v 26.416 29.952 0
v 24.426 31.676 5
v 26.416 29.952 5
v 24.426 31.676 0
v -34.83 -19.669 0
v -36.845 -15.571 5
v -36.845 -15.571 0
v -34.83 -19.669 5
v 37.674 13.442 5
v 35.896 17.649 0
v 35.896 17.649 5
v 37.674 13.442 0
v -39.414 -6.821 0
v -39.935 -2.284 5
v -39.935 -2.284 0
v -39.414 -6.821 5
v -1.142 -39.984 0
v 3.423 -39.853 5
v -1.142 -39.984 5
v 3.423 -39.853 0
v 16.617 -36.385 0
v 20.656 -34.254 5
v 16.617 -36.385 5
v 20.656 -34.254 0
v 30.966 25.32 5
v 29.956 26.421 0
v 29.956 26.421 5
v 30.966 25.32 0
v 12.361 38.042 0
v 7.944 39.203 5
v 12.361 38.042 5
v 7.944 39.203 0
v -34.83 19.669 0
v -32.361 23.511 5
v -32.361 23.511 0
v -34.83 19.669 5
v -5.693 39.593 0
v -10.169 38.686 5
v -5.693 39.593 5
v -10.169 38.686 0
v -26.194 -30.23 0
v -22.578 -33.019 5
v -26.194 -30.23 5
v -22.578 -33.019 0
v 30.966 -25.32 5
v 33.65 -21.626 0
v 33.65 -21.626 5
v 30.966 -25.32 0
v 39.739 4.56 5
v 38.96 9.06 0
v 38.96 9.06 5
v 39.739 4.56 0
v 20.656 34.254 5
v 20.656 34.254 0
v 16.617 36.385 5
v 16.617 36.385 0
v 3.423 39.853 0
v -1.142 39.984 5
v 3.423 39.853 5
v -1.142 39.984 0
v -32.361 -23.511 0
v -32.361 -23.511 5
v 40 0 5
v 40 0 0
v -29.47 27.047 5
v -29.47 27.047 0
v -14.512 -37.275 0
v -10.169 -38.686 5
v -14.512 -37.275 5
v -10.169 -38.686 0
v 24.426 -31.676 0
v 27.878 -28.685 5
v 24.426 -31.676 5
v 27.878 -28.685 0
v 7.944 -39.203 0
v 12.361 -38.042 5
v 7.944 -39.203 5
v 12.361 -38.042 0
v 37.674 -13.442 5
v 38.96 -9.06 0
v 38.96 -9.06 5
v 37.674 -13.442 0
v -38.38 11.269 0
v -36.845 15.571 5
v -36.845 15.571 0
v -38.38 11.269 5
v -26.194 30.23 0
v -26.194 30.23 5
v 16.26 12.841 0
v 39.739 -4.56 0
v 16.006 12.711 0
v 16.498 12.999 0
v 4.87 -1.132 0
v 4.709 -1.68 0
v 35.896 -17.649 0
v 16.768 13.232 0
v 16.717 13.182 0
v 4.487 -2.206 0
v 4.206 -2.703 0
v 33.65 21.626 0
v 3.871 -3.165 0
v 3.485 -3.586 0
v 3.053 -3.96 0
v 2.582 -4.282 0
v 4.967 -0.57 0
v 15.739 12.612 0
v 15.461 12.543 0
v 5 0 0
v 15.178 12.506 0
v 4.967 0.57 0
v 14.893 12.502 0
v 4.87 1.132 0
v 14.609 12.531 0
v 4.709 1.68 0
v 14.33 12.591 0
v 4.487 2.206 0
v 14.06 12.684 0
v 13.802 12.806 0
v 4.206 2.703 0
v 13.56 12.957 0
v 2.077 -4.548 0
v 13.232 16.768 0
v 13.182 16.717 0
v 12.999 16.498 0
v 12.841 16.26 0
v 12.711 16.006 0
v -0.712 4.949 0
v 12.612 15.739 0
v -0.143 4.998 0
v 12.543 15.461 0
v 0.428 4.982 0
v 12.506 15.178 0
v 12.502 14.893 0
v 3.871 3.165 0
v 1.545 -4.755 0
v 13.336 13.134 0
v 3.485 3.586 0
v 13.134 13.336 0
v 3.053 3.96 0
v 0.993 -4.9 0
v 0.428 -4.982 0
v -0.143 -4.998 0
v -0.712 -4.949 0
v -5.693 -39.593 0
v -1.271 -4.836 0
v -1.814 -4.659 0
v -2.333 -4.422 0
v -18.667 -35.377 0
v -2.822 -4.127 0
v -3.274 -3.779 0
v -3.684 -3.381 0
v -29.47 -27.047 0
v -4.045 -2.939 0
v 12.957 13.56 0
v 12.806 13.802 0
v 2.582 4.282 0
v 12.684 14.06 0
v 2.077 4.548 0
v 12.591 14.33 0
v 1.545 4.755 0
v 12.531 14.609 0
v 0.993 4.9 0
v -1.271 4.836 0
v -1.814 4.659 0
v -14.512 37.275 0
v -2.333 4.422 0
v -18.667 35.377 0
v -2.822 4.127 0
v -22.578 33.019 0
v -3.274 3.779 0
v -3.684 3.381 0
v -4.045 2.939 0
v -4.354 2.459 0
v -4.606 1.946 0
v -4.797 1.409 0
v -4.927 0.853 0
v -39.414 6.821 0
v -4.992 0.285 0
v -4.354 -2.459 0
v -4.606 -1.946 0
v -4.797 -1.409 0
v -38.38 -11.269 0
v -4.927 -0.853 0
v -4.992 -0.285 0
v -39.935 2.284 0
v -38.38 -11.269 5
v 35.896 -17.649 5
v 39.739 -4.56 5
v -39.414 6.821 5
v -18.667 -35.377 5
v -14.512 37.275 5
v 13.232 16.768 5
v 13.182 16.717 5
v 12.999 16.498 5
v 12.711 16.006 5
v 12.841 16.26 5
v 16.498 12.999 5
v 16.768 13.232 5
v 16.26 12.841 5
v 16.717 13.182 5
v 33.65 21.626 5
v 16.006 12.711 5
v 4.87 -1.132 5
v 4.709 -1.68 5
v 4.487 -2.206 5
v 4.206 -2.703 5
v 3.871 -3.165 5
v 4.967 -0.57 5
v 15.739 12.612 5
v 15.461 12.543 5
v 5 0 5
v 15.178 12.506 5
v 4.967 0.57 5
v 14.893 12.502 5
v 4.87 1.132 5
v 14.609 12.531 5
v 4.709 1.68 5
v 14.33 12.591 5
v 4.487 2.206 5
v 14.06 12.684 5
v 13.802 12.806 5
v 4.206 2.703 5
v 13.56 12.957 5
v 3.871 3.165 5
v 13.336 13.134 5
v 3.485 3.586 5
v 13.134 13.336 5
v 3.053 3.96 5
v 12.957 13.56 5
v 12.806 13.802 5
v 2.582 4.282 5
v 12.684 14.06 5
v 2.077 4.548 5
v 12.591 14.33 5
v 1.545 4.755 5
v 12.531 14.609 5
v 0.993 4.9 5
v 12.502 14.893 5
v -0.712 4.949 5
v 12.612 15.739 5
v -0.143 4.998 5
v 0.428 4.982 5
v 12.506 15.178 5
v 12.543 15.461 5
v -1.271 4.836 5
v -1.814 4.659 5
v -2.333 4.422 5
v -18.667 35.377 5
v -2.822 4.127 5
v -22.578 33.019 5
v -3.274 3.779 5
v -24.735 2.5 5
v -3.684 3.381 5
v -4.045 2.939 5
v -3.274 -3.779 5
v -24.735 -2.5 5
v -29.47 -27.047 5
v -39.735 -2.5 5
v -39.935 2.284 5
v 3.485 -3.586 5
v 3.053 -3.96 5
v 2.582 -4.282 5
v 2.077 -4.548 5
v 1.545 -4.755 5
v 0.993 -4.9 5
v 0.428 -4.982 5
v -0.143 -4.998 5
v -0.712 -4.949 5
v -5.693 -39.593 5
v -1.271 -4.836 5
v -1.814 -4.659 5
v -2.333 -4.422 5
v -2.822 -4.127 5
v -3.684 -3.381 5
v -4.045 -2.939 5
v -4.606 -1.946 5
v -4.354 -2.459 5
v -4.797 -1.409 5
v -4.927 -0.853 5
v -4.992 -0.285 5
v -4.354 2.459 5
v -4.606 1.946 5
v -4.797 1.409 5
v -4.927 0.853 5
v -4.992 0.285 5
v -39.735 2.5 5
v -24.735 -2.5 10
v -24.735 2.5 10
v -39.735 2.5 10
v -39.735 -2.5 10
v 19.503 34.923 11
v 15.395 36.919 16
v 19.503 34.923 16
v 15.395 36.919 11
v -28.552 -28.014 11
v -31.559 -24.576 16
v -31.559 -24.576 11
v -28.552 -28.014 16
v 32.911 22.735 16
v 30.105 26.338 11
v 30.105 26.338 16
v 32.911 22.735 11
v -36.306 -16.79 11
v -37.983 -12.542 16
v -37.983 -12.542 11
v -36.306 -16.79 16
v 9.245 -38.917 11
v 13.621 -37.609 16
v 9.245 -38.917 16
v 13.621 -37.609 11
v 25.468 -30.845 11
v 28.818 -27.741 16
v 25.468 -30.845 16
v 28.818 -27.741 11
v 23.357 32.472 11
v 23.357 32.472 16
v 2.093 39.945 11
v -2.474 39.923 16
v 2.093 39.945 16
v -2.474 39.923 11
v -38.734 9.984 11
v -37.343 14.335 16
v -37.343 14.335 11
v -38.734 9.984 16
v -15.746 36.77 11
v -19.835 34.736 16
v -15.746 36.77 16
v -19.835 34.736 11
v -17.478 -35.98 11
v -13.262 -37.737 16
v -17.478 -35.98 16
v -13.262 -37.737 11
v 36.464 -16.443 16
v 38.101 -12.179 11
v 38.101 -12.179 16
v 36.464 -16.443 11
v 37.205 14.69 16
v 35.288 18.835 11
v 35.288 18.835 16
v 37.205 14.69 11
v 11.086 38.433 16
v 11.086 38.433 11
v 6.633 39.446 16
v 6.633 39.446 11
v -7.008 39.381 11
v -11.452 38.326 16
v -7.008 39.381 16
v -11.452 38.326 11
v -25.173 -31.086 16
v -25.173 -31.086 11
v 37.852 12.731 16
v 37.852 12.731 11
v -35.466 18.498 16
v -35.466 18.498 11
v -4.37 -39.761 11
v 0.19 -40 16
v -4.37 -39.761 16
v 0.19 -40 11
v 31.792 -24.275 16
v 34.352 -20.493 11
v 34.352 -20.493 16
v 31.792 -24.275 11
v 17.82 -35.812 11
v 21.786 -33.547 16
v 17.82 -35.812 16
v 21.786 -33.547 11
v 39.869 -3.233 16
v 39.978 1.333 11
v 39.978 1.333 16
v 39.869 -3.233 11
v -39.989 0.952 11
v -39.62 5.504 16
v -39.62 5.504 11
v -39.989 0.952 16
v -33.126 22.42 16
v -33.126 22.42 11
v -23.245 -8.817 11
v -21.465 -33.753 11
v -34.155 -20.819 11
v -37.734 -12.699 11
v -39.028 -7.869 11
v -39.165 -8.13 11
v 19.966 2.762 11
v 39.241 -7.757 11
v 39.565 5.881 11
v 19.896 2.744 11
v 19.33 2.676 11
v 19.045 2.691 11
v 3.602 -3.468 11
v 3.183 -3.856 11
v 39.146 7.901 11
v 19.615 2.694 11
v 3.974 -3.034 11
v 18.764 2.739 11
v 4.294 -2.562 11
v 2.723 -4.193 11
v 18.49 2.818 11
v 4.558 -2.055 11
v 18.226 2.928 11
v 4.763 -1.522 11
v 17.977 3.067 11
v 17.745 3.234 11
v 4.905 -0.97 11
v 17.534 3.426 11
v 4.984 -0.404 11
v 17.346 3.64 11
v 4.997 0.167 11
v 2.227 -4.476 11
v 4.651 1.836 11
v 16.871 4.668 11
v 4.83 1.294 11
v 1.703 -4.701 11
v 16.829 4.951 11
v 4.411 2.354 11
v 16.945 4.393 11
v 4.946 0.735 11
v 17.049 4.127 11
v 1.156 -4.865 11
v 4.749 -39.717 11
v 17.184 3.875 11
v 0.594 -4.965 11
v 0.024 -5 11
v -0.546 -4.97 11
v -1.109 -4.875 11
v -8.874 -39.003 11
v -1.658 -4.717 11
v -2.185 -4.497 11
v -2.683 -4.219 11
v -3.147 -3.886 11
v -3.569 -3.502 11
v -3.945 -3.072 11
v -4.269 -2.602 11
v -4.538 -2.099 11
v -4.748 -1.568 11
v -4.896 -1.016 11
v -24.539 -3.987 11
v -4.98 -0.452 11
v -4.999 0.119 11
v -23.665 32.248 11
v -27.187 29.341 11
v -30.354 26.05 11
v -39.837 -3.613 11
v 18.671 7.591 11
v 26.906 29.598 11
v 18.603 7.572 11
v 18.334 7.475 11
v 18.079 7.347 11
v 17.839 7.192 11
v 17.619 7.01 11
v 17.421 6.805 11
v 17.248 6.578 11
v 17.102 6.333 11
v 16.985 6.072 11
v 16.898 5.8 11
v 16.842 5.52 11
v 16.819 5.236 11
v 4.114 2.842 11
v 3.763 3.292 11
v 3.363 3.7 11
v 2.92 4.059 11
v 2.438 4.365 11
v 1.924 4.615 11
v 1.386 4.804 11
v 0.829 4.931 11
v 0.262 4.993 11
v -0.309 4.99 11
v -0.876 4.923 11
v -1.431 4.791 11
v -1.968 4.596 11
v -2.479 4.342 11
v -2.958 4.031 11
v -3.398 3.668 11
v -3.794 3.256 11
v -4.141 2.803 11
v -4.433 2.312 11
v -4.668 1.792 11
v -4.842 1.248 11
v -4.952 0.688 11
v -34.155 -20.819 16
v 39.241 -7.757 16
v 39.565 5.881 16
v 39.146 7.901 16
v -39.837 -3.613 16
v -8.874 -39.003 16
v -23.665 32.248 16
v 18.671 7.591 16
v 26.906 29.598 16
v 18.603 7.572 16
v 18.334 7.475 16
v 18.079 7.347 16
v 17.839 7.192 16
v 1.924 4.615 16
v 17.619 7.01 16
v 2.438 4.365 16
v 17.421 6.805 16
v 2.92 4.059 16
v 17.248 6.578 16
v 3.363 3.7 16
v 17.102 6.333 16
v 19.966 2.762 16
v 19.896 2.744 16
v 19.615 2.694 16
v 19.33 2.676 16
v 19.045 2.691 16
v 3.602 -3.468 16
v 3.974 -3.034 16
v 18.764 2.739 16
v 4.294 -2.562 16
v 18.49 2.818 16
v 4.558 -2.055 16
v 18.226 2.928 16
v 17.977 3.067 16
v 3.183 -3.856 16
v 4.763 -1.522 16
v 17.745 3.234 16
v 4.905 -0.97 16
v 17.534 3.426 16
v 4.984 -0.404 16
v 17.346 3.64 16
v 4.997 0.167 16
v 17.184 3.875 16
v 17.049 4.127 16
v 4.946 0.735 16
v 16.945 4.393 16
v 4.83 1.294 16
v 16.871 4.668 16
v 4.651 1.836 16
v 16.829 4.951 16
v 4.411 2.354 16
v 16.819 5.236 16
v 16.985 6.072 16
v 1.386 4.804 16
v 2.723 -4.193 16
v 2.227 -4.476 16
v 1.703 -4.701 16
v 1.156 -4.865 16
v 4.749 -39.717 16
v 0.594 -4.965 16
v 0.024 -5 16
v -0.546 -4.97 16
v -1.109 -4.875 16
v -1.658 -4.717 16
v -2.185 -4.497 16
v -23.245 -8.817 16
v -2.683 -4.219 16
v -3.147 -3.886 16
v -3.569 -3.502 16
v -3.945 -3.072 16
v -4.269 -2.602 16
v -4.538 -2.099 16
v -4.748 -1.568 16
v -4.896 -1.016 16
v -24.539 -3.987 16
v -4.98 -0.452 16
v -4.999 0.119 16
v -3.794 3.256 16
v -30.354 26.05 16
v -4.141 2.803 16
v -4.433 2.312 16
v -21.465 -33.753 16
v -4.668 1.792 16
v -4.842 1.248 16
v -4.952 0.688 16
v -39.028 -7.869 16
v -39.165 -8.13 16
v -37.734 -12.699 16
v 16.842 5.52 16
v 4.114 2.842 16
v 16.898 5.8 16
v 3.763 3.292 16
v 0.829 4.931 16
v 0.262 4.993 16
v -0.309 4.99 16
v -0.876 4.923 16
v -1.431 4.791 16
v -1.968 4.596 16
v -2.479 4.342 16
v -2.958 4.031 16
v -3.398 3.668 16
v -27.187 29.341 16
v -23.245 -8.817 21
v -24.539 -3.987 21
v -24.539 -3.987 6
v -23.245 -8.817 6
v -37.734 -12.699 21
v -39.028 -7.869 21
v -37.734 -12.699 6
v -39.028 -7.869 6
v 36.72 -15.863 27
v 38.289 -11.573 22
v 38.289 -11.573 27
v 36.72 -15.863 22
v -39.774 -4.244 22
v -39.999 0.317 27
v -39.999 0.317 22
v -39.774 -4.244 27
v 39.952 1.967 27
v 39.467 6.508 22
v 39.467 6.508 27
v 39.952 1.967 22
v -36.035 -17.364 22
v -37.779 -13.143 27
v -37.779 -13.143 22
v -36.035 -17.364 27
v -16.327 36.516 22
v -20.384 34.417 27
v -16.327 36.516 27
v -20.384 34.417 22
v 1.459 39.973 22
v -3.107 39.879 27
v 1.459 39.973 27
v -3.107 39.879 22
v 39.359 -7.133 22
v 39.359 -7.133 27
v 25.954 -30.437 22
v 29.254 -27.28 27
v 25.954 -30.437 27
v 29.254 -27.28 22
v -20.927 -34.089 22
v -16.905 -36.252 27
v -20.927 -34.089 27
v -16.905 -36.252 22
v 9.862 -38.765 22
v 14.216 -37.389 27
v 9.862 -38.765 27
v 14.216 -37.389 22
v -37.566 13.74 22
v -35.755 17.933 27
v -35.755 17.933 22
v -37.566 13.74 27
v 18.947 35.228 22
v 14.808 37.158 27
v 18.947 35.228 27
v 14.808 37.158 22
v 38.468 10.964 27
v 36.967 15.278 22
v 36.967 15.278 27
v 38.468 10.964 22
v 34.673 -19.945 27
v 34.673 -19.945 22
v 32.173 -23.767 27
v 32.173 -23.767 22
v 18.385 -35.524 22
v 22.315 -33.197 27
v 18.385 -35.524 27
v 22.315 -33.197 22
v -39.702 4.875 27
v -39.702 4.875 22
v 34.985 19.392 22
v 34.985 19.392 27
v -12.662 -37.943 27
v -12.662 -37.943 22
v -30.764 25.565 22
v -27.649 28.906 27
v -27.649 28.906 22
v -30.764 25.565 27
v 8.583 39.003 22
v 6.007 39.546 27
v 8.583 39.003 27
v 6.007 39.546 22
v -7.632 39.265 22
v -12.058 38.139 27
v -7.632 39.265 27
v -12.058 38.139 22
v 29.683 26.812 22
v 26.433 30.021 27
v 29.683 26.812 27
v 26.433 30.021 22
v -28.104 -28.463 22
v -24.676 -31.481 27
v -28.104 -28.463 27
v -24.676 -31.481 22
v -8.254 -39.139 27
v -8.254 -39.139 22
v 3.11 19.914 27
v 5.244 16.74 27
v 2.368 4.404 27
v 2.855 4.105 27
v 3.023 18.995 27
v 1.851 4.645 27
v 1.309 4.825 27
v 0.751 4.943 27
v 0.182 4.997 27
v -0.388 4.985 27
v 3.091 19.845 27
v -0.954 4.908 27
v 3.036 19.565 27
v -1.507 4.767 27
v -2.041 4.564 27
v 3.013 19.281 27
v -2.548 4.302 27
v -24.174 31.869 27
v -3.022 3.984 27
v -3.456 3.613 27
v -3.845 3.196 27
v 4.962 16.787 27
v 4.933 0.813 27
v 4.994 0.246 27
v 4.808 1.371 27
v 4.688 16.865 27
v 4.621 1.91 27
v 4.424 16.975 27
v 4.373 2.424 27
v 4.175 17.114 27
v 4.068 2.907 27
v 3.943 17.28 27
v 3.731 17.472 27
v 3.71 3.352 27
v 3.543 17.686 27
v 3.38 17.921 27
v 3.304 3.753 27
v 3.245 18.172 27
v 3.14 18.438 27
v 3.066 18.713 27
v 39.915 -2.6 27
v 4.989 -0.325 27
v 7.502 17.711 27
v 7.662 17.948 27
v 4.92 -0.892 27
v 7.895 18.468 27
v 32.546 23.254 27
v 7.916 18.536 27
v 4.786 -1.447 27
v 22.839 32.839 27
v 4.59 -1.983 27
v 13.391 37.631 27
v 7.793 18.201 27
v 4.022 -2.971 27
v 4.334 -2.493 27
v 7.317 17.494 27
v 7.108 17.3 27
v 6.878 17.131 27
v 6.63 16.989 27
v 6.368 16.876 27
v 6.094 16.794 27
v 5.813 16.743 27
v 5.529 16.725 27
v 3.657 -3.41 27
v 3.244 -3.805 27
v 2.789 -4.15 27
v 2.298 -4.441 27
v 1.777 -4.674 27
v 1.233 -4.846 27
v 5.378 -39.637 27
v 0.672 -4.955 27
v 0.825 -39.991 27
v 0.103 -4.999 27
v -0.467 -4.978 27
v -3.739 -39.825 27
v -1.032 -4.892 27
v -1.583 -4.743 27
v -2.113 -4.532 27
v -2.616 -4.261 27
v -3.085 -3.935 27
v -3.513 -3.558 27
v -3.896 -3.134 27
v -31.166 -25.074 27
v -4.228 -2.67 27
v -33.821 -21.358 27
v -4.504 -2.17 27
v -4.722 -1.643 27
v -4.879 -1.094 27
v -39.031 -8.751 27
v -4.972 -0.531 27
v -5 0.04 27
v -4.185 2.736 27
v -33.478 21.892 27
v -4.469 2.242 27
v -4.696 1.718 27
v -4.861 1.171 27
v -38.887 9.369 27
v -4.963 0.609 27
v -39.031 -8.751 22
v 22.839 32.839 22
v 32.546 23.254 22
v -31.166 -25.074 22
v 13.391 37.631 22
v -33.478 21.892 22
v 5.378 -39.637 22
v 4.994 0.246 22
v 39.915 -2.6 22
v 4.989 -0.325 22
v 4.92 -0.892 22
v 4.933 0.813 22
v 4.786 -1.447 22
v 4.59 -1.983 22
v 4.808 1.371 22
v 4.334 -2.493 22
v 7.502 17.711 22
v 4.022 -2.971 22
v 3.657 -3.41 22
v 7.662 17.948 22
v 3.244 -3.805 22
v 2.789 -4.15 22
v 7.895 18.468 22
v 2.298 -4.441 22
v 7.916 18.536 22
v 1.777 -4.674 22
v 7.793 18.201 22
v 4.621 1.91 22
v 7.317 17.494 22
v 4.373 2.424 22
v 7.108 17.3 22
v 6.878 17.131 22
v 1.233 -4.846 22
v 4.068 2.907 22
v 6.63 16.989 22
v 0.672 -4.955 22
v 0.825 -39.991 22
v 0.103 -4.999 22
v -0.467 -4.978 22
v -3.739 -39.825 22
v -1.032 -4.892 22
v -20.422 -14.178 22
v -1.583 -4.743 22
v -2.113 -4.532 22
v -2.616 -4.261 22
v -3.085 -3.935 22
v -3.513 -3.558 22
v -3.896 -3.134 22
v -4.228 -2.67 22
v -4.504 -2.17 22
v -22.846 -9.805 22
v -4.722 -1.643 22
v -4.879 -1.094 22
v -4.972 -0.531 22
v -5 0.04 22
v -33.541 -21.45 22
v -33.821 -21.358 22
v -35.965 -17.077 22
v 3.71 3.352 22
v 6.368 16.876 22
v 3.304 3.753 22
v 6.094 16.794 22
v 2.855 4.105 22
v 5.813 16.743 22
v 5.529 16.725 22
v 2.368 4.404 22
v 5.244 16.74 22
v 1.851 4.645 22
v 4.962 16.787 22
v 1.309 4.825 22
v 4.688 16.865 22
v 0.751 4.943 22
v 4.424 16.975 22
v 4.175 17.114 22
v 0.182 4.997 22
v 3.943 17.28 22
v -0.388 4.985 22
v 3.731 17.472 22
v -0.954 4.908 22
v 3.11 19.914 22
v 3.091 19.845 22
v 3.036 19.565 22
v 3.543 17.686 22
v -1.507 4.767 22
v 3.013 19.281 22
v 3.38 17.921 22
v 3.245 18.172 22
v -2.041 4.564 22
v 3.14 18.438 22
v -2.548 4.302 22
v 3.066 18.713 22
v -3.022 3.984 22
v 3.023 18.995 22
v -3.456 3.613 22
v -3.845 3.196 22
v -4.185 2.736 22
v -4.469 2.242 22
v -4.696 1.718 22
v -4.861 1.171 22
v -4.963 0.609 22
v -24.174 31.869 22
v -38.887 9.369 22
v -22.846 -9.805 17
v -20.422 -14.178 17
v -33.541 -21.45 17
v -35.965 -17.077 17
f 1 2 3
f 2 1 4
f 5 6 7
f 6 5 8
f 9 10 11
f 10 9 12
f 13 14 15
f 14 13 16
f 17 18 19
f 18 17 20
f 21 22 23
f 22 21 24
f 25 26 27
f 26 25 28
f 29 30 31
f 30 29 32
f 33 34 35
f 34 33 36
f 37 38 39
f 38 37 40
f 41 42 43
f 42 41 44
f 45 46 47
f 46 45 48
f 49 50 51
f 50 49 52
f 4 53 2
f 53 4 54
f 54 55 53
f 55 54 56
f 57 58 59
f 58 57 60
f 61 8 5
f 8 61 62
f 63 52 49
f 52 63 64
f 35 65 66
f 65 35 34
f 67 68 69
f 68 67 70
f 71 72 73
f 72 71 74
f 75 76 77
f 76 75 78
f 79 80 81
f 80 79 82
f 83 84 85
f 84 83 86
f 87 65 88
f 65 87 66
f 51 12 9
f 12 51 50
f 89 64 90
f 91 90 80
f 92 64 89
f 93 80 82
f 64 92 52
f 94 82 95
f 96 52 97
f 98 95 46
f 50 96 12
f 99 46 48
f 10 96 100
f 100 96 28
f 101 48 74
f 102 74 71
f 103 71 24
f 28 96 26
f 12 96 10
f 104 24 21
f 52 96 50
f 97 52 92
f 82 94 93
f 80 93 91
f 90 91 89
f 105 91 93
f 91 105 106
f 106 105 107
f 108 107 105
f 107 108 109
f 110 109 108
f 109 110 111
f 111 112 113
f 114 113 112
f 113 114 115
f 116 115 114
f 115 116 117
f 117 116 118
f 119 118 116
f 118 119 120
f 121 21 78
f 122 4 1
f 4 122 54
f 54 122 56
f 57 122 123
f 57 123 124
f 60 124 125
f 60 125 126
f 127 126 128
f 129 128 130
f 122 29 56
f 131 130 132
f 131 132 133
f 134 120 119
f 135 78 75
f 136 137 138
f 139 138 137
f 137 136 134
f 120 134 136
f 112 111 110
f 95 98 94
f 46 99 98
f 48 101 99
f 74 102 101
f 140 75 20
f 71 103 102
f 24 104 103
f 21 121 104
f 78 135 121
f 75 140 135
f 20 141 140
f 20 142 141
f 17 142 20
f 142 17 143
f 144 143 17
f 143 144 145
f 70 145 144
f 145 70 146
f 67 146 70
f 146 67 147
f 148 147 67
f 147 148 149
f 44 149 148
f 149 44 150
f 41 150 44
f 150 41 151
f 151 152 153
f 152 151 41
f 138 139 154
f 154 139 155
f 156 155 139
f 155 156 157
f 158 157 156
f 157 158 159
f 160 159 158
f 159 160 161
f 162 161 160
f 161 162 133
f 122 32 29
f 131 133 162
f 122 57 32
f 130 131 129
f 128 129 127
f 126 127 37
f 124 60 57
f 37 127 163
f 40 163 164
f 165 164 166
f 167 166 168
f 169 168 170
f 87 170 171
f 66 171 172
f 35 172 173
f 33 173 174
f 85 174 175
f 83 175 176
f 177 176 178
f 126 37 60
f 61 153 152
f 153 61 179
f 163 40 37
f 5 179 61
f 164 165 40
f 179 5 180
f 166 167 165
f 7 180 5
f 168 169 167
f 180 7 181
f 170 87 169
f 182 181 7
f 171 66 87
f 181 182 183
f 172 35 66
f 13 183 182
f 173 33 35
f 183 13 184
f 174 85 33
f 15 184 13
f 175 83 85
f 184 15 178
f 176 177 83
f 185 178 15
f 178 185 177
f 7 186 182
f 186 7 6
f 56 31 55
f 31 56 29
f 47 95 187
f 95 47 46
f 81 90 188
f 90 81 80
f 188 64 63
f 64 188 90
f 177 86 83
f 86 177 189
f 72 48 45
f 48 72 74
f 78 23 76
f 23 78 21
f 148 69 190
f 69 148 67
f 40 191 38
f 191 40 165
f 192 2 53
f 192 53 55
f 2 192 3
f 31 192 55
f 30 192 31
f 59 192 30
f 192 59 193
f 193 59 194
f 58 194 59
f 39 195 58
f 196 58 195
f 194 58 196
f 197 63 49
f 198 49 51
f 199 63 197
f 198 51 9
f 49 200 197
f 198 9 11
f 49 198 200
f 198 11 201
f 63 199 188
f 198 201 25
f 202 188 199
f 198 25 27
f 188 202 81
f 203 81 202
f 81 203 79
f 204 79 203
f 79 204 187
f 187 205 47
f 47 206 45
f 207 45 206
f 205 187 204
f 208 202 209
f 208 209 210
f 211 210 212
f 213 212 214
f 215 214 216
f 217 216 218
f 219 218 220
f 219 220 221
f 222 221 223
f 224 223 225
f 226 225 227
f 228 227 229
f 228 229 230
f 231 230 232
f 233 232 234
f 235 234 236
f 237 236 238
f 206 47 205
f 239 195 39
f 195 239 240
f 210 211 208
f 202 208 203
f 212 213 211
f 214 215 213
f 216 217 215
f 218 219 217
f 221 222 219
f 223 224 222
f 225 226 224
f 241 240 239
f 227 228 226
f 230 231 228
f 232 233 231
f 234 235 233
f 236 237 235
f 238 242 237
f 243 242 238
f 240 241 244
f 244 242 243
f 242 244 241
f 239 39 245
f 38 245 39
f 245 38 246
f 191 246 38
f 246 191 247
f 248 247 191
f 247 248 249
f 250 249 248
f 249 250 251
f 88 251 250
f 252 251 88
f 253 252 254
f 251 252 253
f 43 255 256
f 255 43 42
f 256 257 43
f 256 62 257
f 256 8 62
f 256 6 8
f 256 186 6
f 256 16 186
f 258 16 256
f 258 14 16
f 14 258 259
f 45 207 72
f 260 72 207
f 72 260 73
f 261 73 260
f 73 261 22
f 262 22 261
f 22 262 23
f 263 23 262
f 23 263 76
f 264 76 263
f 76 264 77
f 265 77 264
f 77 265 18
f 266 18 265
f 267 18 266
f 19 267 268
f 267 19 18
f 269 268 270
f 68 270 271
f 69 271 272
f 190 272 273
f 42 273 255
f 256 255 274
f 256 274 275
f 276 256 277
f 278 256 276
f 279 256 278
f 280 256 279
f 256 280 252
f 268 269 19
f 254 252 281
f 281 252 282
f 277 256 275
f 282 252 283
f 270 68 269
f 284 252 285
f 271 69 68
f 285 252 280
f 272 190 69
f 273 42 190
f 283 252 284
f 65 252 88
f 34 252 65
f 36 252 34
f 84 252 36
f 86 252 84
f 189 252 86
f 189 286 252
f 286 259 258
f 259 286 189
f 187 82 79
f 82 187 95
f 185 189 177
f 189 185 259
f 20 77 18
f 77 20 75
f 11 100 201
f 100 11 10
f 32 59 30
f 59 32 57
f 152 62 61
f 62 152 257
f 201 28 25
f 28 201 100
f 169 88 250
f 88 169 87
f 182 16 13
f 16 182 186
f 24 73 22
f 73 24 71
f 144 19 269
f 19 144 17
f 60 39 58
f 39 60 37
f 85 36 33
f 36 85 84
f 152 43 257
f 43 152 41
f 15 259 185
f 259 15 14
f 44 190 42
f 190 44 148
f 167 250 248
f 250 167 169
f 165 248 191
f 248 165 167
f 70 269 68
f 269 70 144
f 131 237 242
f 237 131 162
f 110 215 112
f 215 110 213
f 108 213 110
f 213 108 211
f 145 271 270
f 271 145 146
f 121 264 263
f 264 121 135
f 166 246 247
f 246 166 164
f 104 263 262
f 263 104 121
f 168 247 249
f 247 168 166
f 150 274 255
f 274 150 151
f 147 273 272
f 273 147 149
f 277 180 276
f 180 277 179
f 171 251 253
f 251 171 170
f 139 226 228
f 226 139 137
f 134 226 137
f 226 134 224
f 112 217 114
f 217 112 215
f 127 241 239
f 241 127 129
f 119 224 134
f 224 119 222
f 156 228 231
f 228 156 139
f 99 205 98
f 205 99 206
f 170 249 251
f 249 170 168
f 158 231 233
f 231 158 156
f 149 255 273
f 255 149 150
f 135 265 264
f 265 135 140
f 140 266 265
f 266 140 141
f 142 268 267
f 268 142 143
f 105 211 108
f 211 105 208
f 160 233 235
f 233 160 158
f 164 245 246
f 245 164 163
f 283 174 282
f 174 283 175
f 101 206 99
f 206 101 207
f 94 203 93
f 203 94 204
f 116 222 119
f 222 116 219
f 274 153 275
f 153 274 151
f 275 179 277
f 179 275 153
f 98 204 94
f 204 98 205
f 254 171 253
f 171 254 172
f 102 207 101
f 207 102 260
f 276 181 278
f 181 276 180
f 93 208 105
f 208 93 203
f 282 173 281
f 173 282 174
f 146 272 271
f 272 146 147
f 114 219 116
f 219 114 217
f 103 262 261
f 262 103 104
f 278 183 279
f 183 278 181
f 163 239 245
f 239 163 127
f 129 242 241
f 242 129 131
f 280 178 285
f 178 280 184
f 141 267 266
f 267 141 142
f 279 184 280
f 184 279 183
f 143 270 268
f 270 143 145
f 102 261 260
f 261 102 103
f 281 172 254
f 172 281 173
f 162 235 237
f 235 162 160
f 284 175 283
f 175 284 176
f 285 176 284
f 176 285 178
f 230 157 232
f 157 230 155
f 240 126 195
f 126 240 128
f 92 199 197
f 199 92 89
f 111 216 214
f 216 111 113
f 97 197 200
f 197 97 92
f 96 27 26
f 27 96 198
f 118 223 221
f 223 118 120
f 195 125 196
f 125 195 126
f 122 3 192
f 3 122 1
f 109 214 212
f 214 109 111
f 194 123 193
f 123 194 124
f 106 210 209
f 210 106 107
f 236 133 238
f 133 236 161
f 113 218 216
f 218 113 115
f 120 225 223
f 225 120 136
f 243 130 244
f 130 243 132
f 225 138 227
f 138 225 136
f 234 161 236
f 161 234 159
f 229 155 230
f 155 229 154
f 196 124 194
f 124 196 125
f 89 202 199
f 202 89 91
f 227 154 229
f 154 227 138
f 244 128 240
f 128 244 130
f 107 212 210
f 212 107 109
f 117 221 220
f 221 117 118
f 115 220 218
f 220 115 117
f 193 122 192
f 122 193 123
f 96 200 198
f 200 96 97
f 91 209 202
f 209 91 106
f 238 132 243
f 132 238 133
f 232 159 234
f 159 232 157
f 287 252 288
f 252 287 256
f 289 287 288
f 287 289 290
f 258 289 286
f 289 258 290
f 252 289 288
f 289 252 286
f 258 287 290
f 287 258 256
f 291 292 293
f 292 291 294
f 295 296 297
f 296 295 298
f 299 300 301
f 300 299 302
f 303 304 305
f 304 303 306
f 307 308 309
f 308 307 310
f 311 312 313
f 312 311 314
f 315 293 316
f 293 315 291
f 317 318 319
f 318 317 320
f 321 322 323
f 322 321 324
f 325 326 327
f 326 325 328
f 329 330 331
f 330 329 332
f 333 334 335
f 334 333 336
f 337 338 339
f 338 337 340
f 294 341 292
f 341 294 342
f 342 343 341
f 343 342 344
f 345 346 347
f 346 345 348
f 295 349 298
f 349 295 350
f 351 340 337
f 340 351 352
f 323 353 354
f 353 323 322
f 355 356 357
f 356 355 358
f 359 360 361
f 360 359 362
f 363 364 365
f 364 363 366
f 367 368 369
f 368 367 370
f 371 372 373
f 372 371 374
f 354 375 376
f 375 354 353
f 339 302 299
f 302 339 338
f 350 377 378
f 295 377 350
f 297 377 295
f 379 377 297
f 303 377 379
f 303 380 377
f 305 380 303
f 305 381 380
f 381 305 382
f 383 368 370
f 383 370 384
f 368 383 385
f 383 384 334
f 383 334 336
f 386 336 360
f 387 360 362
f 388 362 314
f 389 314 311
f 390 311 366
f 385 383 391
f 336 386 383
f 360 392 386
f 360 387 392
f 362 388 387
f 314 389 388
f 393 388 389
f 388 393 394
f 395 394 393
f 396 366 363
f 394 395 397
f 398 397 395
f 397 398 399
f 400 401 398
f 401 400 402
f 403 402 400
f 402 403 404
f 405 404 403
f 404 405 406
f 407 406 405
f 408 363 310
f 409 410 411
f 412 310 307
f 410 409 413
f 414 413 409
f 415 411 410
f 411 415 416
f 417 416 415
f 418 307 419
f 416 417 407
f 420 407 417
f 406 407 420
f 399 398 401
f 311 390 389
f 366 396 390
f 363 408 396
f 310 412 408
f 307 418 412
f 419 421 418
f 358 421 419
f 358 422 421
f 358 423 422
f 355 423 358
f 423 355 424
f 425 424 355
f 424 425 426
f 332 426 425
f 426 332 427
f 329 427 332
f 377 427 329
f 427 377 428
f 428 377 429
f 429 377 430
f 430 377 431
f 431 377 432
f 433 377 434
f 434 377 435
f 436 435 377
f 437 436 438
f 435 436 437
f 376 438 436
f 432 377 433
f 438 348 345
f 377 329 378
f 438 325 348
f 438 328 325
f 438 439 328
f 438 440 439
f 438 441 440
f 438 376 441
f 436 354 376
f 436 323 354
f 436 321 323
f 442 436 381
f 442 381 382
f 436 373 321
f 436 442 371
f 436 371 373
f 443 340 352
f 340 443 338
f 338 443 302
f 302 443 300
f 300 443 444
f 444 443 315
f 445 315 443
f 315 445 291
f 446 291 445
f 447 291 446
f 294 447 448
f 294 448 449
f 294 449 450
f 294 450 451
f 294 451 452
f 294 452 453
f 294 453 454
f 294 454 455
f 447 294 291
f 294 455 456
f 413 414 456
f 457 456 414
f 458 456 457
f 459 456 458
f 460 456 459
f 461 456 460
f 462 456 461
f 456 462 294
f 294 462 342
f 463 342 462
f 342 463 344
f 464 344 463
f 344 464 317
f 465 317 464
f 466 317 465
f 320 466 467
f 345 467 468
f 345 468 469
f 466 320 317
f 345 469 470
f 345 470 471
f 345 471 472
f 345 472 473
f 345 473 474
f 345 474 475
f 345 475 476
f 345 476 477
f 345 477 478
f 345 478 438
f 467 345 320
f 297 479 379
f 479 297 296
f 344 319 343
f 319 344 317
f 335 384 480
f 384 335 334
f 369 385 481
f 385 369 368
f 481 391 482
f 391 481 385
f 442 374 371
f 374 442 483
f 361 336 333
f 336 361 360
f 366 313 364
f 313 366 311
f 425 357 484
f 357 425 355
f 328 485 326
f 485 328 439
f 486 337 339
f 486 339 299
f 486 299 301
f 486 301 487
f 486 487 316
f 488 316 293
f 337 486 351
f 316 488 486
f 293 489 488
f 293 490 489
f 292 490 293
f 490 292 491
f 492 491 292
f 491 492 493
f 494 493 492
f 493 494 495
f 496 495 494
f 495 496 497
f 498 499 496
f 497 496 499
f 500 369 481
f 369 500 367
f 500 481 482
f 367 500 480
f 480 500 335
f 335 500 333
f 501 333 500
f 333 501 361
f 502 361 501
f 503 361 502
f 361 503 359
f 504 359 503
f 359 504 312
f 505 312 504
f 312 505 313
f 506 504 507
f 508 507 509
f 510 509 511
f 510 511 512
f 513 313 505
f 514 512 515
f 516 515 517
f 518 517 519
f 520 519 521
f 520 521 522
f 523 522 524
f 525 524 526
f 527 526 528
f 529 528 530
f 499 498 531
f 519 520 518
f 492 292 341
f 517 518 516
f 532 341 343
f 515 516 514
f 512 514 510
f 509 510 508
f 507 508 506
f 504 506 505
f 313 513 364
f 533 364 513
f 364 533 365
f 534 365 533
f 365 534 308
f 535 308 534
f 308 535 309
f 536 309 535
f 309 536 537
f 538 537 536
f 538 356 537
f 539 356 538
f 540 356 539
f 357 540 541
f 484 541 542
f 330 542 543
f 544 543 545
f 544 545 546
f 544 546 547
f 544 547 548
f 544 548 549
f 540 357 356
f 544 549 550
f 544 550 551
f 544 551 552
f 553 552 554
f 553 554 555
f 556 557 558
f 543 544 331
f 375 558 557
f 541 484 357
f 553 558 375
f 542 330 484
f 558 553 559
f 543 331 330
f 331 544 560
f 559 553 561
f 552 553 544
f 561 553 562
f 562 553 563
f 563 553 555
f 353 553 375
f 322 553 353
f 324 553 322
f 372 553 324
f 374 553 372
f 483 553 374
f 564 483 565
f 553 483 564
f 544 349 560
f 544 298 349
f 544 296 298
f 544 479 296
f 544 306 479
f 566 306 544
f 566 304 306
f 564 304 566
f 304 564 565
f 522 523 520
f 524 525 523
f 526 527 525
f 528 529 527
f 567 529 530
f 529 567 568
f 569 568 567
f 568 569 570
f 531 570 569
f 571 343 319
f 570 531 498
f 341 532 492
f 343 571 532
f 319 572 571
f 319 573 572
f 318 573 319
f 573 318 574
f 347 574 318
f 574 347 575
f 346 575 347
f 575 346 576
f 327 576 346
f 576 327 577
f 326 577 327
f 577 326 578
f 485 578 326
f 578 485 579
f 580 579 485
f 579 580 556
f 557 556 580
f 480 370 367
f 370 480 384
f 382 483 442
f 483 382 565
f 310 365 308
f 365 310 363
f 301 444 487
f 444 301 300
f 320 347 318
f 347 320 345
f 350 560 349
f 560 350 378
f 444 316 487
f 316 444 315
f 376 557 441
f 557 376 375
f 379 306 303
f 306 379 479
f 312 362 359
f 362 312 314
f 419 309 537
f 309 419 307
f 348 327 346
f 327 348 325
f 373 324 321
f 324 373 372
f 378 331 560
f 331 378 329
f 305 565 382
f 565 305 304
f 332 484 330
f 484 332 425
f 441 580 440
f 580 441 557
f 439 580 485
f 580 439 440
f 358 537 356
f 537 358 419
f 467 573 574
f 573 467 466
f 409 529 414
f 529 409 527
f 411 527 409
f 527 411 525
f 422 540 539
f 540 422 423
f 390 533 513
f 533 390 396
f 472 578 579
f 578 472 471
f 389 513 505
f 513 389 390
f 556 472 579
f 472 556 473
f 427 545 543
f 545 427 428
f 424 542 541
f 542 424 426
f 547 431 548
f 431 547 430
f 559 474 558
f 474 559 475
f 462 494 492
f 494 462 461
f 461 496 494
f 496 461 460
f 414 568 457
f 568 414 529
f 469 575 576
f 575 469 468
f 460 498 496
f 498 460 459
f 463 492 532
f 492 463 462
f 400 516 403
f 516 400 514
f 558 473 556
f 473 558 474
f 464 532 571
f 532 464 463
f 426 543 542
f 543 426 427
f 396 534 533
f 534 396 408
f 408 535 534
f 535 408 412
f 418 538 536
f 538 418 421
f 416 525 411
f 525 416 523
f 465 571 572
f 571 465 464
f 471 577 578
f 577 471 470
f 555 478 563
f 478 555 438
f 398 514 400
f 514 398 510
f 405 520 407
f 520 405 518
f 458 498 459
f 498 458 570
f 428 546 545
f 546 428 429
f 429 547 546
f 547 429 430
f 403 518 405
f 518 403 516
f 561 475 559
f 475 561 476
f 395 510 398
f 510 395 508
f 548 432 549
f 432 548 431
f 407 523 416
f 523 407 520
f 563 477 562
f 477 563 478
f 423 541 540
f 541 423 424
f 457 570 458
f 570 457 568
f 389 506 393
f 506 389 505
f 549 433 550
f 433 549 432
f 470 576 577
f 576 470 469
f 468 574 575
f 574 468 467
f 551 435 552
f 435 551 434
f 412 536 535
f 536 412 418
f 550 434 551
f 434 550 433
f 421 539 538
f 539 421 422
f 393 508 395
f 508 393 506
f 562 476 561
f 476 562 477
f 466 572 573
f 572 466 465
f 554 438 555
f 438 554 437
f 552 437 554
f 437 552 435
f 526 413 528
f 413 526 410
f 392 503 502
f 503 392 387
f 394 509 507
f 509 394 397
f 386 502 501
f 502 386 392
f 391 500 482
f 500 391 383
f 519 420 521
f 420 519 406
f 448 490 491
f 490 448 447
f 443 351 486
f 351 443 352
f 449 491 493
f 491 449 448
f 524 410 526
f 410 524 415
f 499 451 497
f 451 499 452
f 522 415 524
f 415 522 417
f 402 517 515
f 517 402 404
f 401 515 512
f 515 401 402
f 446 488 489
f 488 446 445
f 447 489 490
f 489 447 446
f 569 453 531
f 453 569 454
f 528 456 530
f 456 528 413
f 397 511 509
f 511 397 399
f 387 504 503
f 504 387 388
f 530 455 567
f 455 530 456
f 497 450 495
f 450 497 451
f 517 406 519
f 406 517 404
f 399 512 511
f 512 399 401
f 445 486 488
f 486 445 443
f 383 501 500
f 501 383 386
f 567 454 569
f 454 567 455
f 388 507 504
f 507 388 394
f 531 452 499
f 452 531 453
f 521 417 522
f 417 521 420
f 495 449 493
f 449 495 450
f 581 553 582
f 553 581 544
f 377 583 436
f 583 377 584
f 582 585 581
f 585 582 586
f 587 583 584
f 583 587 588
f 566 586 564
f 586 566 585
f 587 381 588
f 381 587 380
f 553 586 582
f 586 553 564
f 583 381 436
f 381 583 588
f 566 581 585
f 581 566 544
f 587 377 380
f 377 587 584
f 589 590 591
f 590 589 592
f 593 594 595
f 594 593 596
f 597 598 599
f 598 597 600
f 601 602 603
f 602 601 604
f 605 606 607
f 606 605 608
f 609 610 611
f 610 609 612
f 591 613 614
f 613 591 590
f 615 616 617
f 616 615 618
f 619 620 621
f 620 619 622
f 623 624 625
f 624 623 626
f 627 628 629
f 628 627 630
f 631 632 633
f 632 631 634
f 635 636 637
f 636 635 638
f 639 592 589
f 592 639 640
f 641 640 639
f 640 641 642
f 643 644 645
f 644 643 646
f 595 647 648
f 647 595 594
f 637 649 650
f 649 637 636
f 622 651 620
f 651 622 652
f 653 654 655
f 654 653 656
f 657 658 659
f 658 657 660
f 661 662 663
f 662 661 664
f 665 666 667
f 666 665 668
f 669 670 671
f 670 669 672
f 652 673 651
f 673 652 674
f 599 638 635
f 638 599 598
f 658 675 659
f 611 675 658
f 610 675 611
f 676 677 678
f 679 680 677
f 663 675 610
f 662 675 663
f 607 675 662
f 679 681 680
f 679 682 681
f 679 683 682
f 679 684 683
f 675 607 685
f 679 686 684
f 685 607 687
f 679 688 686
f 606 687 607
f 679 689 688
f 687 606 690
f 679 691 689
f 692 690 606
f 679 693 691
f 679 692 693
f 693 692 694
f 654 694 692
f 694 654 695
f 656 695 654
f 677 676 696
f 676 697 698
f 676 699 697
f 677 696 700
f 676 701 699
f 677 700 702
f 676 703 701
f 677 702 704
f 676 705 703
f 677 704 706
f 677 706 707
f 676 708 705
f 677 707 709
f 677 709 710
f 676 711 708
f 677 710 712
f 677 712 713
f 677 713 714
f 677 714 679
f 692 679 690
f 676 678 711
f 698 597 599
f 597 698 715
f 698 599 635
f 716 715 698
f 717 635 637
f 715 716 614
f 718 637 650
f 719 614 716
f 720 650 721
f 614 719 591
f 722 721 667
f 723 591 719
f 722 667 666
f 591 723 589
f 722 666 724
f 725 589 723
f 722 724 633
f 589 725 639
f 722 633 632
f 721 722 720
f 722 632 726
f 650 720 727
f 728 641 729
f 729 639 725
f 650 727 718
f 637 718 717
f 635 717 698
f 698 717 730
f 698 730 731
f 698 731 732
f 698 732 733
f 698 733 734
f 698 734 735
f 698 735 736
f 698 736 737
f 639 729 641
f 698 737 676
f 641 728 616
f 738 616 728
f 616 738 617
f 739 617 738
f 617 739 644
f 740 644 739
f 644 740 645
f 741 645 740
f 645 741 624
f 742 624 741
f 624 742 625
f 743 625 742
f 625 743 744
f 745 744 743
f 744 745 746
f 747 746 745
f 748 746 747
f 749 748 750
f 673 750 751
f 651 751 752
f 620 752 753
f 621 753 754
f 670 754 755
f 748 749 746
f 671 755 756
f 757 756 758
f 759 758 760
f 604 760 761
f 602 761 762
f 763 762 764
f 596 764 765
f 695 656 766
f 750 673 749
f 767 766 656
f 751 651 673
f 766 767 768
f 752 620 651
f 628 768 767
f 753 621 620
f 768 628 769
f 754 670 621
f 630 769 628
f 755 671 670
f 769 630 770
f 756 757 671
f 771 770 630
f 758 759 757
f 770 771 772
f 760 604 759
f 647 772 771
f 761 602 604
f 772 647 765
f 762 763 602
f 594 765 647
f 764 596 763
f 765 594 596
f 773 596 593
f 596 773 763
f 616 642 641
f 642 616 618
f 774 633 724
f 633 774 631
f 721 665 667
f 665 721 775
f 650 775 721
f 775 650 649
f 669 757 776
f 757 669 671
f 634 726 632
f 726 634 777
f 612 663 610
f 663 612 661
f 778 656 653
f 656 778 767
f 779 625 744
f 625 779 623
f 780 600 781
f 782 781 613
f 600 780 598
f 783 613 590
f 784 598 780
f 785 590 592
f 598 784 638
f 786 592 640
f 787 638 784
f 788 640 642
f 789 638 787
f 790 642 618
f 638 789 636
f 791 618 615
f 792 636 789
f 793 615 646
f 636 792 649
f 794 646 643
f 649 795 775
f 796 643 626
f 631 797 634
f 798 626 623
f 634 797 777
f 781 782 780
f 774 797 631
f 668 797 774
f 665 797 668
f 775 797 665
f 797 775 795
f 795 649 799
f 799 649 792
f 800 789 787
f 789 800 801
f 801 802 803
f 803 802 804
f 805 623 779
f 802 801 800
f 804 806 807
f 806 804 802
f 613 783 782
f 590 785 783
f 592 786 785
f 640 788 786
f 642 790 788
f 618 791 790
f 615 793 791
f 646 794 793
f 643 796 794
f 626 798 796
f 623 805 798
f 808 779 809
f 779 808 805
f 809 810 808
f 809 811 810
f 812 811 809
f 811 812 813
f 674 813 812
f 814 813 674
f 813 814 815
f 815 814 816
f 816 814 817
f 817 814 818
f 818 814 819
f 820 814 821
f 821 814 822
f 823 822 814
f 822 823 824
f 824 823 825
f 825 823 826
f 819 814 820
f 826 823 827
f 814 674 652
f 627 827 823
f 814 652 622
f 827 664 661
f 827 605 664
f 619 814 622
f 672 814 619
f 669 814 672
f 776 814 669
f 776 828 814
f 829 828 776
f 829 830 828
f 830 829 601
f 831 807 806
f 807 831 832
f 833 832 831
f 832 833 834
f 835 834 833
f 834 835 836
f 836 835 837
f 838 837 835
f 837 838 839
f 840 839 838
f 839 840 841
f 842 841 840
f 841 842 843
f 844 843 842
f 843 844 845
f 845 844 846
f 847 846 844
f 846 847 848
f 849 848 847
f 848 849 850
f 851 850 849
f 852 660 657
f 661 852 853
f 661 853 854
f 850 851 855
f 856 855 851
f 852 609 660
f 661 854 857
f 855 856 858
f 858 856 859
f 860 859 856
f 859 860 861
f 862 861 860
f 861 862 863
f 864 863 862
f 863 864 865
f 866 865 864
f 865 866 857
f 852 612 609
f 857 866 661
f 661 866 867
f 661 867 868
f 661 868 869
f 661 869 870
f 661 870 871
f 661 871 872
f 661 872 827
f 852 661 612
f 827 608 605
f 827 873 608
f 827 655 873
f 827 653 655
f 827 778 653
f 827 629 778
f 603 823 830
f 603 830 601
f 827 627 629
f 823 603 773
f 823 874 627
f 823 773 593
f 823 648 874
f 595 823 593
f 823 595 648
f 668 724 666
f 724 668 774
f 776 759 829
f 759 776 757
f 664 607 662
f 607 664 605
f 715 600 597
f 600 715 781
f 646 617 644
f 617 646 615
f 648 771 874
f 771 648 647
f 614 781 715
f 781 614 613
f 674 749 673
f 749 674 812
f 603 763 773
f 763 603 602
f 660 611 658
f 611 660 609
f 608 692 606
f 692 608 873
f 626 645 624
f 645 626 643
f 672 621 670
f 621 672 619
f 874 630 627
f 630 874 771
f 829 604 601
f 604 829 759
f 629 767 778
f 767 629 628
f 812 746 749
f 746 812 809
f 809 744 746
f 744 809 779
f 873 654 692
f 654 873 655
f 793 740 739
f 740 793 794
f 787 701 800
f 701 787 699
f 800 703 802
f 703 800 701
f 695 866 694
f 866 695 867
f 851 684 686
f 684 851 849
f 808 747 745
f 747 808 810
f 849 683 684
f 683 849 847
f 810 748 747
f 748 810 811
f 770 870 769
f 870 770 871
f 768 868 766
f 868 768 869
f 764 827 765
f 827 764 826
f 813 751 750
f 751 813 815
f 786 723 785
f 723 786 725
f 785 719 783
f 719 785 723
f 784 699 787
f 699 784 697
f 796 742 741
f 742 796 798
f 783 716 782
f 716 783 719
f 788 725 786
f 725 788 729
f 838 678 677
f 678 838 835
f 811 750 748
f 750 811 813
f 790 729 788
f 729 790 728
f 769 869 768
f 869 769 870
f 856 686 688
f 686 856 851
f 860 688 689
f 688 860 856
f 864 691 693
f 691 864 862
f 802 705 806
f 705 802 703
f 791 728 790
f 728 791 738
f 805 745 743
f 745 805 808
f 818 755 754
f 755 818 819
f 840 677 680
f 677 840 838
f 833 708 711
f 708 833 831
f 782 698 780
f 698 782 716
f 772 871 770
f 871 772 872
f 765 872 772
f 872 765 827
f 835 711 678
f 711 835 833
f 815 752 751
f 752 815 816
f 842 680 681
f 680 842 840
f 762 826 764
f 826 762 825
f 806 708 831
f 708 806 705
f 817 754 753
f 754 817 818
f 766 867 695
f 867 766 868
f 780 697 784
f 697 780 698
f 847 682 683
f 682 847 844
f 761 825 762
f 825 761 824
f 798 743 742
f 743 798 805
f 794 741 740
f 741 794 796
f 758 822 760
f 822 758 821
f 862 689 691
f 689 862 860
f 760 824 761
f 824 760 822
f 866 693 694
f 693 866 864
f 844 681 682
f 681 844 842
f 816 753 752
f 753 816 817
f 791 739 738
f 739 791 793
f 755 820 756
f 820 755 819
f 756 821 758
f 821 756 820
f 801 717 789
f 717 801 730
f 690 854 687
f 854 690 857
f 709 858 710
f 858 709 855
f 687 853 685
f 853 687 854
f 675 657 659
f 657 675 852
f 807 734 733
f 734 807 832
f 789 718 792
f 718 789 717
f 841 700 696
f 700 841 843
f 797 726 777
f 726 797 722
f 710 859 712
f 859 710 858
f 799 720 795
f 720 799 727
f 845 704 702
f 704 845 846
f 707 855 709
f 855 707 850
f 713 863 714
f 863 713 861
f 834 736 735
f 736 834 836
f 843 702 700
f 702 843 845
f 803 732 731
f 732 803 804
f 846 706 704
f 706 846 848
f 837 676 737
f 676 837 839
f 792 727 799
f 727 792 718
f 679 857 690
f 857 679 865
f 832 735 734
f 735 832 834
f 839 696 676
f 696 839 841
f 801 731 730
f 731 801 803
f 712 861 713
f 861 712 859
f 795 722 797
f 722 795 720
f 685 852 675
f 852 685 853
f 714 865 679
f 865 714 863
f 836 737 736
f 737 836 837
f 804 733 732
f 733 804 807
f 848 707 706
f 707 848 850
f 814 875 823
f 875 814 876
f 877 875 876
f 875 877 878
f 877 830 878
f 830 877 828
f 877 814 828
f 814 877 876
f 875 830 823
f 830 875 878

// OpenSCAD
$fn=55;

module tab() {
	cube([15,5,10]);
}

module largeTab() {
	translate([0,0,-5]) {
		cube([15,5,15]);
	}
}

module notch() {
	hull() {
		translate([0,-2.5,0]) {
			cube([20,5,5]);
		}
		cylinder(h=5, r=2.5);
	}
}

module rotorBody() {
	difference() {
		cylinder(h=5, r=40);
		cylinder(h=5, r=5);
	}
}

module rearRotor() {
	union() {
		translate([-39.735, -2.5, 0]) {
			tab();
		}
		difference() {
			rotorBody();
			translate([15,15,0]) {
				rotate([0,0,45]) {
					notch();
				}
			}
		}
	}
}

module centreRotor()  {
	union() {
		translate([-39.735, -2.5, 0]) {
			largeTab();
		}
		difference() {
			rotorBody();
			translate([20,0,0]) {
				notch();
			}
		}
	}
}

module frontRotor() {
	union() {
		translate([-39.735, -2.5, 0]) {
			tab();
		}
		difference() {
			rotorBody();
			rotate([0,0,-45]) {
				translate([20,0,0]) {
					notch();
				}
			}
		}
	}
}

union() {
	rearRotor();
	rotate([0,0,15]) {
		translate([0,0,11]) {
			centreRotor();
		}
	}
	translate([0,0,27]) {
		rotate([0,180,209]) {
			frontRotor();
		}
	}
}
